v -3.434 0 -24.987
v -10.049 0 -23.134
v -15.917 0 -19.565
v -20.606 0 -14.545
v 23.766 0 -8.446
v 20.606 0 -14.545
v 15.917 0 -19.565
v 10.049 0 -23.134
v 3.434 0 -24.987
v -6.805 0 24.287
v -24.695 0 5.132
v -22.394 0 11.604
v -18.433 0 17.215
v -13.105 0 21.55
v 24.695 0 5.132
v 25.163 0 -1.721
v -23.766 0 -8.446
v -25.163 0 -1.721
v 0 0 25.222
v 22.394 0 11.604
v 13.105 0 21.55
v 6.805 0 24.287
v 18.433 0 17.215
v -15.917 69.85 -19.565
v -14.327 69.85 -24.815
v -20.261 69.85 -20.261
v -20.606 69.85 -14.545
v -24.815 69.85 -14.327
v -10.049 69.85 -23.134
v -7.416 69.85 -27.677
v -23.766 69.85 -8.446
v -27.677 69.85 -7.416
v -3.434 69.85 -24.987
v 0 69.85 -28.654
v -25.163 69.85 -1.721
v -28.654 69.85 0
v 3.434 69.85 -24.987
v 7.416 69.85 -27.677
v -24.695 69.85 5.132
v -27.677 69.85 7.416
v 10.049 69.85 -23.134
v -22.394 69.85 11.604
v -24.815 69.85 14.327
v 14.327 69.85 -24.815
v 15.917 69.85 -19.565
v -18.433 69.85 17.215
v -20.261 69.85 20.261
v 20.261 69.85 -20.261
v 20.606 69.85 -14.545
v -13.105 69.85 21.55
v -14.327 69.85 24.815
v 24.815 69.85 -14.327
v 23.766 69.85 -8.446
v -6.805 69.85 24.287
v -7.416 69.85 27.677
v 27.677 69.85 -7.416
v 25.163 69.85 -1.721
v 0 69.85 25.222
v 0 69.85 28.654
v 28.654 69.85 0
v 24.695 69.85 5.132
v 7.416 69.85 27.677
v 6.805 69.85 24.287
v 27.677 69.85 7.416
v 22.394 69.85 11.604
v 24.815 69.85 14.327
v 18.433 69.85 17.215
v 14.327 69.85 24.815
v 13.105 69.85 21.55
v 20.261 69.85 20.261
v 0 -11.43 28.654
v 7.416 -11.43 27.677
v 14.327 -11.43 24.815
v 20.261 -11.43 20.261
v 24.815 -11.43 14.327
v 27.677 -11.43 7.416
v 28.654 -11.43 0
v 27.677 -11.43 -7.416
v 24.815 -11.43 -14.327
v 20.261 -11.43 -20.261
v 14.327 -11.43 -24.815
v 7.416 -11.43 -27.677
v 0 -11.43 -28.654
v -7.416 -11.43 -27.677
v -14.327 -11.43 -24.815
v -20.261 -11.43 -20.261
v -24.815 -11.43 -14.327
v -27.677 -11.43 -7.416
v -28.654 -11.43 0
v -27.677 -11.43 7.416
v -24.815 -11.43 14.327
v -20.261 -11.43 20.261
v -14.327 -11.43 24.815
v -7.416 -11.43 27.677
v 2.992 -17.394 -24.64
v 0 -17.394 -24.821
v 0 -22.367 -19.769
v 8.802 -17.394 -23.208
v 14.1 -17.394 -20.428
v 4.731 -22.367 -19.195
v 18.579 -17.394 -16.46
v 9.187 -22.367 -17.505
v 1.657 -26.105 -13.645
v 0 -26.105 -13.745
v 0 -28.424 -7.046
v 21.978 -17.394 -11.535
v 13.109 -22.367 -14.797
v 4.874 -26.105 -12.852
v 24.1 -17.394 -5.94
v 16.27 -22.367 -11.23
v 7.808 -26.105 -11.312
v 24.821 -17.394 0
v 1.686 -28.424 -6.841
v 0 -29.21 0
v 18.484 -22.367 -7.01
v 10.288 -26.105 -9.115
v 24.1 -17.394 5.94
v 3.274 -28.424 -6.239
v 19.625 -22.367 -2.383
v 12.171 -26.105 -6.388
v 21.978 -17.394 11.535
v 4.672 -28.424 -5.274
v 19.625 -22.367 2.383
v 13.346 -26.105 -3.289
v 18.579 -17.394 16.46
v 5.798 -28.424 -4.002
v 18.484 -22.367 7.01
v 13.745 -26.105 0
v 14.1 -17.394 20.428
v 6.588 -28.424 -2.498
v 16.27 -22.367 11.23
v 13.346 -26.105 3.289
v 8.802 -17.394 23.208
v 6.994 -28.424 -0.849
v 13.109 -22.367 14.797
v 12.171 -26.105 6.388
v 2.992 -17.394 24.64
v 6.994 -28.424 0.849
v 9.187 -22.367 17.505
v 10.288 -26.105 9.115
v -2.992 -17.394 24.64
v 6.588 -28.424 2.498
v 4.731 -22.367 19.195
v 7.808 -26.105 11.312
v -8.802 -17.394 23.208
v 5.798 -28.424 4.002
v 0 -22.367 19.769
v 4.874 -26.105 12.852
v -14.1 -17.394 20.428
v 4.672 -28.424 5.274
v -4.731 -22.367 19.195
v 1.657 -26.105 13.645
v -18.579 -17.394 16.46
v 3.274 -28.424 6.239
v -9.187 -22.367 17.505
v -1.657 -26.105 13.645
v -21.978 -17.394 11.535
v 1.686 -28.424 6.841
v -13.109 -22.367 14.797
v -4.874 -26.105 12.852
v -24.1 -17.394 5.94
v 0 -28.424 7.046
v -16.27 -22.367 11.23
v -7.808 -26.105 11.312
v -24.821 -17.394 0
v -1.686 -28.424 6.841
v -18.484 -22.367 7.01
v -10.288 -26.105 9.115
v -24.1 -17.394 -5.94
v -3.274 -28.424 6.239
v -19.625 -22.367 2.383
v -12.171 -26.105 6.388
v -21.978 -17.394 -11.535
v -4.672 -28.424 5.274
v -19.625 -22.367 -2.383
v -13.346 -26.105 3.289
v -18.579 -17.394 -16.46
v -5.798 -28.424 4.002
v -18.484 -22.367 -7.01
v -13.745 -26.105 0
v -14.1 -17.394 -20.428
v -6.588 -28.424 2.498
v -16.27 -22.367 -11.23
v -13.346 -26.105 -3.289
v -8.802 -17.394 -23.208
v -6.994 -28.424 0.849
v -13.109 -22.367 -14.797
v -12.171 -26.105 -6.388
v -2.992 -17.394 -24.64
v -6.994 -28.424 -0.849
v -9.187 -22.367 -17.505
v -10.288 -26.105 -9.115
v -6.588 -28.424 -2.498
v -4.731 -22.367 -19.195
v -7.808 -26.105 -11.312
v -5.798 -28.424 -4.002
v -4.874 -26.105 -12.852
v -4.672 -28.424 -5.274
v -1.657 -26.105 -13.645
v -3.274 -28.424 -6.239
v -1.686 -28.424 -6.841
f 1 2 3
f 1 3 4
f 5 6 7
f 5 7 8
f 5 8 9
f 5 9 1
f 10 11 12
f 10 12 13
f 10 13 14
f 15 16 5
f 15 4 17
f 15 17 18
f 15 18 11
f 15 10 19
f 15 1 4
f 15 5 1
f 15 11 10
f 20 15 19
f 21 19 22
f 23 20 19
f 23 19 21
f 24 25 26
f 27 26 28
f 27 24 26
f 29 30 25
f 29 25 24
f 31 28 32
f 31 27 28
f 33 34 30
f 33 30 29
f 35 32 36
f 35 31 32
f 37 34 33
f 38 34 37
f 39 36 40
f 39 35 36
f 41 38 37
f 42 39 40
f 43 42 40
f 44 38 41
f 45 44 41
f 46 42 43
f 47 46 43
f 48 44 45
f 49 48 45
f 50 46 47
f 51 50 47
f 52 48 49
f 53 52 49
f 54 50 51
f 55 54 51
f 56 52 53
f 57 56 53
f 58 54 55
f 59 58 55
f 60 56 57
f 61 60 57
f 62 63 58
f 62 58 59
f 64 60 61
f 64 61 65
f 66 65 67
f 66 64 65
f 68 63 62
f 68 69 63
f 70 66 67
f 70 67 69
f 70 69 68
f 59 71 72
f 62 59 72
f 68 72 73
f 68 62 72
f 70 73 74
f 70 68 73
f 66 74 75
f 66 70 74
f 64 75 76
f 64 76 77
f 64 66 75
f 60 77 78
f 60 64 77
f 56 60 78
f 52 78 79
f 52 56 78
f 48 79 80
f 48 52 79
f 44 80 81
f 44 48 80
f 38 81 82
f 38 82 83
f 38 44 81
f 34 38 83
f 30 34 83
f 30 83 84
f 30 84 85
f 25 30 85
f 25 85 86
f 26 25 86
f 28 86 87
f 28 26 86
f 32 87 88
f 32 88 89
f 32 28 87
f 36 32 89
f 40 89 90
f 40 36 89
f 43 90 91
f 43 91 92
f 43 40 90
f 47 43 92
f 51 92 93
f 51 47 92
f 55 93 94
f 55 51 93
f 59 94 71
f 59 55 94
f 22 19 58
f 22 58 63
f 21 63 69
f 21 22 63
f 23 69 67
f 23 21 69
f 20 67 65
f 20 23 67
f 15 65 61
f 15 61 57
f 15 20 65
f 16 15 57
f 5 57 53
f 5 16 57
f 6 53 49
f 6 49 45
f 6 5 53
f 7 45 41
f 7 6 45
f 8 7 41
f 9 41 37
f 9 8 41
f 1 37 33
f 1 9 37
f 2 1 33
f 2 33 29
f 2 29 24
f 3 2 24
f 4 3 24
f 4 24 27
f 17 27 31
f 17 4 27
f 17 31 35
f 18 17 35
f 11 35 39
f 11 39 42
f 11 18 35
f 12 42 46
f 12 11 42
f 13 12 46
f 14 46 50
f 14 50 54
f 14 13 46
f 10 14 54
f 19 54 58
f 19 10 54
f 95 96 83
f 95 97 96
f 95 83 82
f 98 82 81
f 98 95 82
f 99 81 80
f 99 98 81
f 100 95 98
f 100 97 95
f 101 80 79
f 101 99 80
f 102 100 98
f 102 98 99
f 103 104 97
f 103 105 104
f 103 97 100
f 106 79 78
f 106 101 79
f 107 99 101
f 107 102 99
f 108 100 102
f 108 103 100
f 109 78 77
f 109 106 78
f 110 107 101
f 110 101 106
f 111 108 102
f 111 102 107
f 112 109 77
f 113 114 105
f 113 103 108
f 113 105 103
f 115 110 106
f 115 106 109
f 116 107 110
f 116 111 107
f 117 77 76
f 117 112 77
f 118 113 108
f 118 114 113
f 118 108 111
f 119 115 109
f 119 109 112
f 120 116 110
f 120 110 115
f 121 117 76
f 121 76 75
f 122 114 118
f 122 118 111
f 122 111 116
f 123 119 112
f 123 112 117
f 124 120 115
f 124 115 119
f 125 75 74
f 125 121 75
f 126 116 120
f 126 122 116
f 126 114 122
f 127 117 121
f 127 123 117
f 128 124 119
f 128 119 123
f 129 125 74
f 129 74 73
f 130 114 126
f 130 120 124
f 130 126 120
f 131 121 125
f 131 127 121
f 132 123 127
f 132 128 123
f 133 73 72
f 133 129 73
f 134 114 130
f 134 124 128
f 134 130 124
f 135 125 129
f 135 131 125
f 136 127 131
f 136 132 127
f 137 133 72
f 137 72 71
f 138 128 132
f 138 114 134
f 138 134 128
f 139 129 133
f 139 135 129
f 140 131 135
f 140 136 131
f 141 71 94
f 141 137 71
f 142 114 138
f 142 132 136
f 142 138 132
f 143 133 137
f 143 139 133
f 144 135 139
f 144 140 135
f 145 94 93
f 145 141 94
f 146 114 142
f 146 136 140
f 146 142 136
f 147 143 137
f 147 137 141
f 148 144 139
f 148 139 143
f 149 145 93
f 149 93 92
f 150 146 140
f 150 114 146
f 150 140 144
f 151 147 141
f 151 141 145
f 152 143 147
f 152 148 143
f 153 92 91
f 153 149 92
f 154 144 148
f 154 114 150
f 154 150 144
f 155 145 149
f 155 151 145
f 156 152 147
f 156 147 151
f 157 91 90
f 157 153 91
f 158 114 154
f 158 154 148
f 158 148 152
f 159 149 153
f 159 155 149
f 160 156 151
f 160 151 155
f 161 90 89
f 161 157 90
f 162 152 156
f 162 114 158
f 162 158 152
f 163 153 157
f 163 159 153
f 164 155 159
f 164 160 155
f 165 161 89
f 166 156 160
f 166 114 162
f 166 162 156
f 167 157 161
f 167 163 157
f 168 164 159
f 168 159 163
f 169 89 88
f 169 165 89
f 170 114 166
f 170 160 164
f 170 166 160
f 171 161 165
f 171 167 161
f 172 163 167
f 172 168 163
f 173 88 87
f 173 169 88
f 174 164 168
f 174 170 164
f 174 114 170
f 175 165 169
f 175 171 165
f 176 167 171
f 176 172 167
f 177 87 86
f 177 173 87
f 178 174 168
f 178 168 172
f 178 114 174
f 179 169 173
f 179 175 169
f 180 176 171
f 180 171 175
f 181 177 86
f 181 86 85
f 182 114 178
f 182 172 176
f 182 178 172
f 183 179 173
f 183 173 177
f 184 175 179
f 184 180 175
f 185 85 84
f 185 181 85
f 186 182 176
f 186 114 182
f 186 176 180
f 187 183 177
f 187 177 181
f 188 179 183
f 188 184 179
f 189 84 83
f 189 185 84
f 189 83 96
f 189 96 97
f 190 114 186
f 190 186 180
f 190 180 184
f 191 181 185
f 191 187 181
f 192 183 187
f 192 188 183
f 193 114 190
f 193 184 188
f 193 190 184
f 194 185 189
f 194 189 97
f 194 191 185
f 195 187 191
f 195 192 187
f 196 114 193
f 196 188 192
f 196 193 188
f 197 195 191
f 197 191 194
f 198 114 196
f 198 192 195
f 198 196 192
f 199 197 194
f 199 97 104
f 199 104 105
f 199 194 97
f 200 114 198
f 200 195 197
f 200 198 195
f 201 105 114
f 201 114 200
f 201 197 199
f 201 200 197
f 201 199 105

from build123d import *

# Parameters (mm, degrees)
SKETCH1_R           = 28.65374
SKETCH1_R_2         = 25.2222
BOSS_EXTRUDE1_DEPTH = 69.85
SKETCH1_3_R         = 28.65374
SKETCH1_3_R_2       = 25.2222
BOSS_EXTRUDE2_DEPTH = 11.43
DOME1_FACE_RADIUS   = 28.65374
DOME1_HEIGHT        = 17.78


with BuildPart() as part:
    # Sketch1 → Boss-Extrude1 (new body)
    with BuildSketch(Plane(origin=(0, 0, 0), x_dir=(1, 0, 0), z_dir=(0, 1, 0))):
        with Locations(Location((0, 0, 0), (0, 0, 270))):
            Circle(SKETCH1_R)
        with Locations(Location((0, 0, 0), (0, 0, 270))):
            Circle(SKETCH1_R_2, mode=Mode.SUBTRACT)
    extrude(amount=BOSS_EXTRUDE1_DEPTH)

    # Sketch1<3> → Boss-Extrude2 (add)
    with BuildSketch(Plane(origin=(0, 0, 0), x_dir=(1, 0, 0), z_dir=(0, 1, 0))):
        with Locations(Location((0, 0, 0), (0, 0, 270))):
            Circle(SKETCH1_3_R)
        with Locations(Location((0, 0, 0), (0, 0, 270))):
            Circle(SKETCH1_3_R_2, mode=Mode.SUBTRACT)
        with Locations(Location((0, 0, 0), (0, 0, 270))):
            Circle(SKETCH1_3_R_2)
    extrude(amount=-BOSS_EXTRUDE2_DEPTH)

    # Dome1: a dome of height H over a round flat face of radius A is a cap of a sphere of radius (A * A + H * H) / (2 * H)
    dome1_r = (DOME1_FACE_RADIUS * DOME1_FACE_RADIUS + DOME1_HEIGHT * DOME1_HEIGHT) / (2 * DOME1_HEIGHT)
    dome1_base = Plane((0, -11.43, 0), z_dir=(0, -1, 0))
    with Locations(dome1_base.offset(DOME1_HEIGHT - dome1_r)):
        dome1_ball = Sphere(dome1_r, mode=Mode.PRIVATE)
    add(split(dome1_ball, bisect_by=dome1_base, keep=Keep.TOP, mode=Mode.PRIVATE))


solid = part.part
